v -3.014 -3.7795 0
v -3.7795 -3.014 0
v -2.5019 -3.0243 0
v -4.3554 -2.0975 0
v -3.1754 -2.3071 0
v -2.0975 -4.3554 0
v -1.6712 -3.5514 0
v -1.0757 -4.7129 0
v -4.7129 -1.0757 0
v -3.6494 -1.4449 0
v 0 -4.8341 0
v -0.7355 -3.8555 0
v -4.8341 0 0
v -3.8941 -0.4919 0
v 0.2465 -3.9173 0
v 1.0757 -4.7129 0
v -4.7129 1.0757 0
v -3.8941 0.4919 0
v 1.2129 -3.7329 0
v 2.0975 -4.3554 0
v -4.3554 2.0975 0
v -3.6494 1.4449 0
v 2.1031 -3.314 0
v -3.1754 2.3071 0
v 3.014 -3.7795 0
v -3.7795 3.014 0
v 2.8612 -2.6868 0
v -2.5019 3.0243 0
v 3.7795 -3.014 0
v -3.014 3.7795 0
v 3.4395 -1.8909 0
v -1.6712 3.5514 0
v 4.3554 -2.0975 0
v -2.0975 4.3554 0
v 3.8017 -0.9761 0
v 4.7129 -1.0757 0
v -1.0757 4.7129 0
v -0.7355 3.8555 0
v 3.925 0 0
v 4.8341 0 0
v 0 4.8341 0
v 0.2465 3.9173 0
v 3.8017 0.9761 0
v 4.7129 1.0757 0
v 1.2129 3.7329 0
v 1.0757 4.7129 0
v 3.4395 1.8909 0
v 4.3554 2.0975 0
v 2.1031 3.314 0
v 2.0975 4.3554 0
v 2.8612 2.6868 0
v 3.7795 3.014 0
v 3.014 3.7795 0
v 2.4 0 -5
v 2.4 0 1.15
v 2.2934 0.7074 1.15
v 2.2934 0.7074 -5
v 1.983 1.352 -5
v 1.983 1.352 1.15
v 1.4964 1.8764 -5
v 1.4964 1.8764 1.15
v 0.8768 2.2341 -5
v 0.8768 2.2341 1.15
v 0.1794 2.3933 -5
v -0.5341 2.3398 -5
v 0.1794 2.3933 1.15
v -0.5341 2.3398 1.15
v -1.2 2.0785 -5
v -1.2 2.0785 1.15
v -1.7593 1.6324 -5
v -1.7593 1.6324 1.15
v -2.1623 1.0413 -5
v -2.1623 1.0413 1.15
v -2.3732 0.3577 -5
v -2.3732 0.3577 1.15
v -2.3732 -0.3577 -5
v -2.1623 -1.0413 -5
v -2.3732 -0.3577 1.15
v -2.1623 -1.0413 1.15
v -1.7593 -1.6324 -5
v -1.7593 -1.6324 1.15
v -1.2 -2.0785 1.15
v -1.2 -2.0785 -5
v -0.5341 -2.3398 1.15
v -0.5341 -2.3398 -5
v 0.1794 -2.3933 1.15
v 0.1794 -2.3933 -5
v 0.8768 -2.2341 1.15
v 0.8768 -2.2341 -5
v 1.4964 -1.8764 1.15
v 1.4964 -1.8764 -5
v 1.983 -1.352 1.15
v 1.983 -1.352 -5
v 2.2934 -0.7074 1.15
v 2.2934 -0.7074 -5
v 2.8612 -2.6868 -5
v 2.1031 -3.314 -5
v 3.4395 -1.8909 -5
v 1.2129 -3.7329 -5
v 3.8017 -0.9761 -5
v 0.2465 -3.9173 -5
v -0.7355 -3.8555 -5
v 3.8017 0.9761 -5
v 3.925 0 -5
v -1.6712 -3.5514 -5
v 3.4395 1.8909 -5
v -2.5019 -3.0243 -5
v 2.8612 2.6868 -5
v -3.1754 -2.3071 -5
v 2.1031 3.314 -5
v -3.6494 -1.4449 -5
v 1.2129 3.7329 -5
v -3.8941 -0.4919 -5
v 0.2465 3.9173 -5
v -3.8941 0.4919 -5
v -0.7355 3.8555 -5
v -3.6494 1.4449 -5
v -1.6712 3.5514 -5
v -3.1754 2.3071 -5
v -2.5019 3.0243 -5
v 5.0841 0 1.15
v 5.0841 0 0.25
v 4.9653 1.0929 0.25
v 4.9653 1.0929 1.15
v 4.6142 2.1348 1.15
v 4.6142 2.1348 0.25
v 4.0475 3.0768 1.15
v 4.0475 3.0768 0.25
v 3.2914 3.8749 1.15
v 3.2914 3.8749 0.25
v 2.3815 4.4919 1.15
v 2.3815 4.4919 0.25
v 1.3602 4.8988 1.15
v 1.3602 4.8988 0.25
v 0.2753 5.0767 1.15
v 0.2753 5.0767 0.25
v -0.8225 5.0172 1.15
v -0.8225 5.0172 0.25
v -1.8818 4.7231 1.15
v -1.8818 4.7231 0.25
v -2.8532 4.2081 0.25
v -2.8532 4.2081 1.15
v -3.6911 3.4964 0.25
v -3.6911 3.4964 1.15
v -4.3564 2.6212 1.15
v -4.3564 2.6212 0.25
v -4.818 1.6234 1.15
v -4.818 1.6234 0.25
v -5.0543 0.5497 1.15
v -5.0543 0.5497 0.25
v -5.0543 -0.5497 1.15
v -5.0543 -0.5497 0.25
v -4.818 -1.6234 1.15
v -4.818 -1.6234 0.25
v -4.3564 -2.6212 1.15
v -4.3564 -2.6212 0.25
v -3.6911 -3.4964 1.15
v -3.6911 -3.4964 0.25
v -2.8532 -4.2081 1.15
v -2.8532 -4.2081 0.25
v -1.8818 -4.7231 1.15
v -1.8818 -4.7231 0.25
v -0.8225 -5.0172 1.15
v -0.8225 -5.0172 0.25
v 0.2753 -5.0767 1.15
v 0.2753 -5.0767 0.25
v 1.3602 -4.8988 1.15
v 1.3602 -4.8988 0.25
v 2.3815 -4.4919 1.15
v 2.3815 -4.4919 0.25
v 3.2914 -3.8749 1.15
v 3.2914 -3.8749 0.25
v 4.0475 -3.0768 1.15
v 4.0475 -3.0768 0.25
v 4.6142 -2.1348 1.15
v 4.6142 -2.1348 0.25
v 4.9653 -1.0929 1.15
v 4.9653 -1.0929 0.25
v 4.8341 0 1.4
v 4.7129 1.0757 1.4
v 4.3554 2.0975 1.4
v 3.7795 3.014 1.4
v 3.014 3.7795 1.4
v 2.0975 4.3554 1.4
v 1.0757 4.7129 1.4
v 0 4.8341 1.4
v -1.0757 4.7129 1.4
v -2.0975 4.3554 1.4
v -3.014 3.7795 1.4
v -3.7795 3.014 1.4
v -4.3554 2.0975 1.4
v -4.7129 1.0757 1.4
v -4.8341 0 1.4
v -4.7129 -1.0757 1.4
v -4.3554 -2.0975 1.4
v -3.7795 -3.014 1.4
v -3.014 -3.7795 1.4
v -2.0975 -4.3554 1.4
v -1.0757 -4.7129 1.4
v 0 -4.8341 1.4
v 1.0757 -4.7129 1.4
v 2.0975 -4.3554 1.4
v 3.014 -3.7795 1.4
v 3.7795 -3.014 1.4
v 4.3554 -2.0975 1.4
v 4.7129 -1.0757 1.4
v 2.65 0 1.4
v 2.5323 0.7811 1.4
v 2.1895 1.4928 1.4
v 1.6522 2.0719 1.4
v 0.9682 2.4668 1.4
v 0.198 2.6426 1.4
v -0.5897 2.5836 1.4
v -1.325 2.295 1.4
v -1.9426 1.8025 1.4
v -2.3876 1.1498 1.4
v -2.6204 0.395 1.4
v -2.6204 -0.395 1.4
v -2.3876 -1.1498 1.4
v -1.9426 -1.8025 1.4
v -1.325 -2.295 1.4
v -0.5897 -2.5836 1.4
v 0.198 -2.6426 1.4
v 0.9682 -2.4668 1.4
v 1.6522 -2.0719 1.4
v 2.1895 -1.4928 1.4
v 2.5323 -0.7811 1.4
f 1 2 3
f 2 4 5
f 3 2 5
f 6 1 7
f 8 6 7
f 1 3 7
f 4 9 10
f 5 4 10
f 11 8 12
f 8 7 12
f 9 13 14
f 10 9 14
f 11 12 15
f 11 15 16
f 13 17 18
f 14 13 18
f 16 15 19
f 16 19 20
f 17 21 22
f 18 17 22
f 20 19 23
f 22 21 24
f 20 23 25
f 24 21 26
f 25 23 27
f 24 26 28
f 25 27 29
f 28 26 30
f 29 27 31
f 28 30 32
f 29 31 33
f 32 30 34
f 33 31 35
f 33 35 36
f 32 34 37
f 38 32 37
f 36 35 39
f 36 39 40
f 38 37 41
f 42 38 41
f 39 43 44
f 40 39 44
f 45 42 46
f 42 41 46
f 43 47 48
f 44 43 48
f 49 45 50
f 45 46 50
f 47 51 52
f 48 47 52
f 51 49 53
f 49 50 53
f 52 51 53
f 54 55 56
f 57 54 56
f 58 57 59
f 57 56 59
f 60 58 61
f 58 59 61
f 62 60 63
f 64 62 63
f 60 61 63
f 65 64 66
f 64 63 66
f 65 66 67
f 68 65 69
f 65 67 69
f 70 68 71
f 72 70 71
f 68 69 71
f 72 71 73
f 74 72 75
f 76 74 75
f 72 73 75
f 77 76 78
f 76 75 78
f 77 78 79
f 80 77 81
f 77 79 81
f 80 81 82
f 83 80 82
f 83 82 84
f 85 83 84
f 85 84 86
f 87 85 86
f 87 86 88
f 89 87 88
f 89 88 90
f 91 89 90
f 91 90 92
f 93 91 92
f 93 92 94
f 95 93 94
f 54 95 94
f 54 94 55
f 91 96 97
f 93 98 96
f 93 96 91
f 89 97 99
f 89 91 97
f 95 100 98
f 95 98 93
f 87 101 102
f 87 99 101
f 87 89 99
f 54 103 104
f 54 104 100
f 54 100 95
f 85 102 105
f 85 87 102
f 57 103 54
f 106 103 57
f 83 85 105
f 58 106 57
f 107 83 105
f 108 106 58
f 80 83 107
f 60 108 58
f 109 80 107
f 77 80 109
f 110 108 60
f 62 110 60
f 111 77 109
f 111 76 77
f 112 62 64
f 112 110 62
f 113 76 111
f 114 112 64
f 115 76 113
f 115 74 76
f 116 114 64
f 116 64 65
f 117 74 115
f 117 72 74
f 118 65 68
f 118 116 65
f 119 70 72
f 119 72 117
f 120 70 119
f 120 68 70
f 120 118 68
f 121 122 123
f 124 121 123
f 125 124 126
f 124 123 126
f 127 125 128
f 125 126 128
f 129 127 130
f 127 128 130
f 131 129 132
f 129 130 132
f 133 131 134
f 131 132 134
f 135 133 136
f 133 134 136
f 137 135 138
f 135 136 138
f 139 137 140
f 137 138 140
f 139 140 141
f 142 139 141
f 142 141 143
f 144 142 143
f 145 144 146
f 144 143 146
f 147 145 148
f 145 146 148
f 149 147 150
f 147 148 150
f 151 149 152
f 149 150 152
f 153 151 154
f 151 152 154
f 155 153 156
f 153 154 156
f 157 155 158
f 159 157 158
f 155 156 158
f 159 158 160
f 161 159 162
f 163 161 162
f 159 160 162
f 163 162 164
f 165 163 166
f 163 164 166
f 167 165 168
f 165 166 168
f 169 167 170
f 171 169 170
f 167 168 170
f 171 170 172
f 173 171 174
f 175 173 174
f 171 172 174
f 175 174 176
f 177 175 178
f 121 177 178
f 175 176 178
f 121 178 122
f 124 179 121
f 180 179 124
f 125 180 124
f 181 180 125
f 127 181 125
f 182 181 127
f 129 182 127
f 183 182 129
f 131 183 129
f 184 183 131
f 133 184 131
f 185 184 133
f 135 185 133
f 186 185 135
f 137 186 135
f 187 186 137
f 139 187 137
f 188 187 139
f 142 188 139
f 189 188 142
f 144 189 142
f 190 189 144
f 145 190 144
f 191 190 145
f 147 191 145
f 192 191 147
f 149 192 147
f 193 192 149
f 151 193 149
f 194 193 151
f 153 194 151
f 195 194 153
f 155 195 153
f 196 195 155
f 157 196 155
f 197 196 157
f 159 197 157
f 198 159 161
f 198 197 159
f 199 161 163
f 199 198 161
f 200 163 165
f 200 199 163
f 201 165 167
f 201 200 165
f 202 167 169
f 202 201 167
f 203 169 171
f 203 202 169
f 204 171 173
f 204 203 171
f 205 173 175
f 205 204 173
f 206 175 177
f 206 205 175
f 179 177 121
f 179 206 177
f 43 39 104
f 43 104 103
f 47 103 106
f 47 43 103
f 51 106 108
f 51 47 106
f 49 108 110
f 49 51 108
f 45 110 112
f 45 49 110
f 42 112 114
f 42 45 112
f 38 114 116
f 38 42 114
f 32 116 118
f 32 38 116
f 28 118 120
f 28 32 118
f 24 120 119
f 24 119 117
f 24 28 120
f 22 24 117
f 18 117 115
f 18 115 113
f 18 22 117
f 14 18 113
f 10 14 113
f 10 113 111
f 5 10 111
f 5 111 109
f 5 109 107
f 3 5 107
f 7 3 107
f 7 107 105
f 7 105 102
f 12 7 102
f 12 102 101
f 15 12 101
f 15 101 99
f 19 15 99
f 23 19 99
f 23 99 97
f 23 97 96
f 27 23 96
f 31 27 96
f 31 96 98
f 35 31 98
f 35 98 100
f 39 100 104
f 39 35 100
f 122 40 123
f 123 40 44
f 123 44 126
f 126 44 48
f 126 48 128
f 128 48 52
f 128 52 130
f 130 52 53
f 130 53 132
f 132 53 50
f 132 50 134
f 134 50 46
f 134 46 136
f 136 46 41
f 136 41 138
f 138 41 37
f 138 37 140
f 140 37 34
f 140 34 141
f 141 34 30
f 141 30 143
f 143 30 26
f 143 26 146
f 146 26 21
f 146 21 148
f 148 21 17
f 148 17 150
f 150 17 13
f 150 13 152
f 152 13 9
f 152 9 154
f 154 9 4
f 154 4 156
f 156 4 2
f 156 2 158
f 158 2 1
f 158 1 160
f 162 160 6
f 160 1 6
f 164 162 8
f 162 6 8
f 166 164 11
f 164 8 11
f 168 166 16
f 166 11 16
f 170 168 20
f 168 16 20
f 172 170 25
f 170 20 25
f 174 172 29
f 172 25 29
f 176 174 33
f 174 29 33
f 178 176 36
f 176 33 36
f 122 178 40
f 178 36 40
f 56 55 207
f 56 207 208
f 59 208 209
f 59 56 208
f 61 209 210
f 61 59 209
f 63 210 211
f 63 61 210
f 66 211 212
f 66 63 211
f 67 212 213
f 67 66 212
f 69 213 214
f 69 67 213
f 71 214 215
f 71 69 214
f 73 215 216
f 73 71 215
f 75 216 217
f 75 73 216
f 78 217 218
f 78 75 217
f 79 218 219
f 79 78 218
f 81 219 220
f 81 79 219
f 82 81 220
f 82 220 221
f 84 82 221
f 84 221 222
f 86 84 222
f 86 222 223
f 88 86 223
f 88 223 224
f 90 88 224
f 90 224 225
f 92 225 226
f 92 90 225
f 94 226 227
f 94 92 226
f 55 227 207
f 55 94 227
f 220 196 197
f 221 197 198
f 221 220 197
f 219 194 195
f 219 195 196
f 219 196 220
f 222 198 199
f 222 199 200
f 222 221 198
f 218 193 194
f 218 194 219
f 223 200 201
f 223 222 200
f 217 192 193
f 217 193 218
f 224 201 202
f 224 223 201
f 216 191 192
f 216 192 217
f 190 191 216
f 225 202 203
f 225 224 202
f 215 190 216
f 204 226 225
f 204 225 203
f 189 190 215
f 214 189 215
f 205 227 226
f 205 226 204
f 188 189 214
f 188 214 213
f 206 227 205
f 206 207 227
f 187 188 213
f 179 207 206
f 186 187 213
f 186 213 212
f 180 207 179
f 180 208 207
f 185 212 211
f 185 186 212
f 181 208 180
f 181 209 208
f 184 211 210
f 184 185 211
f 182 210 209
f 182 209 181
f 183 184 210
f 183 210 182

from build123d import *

# Parameters (mm, degrees)
SKETCH1_R           = 3.925
BOSS_EXTRUDE1_DEPTH = 11
SKETCH2_R           = 5.084149635
BOSS_EXTRUDE2_DEPTH = 1.4
SKETCH3_R           = 2.4
CUT_EXTRUDE1_DEPTH  = 15.333776719
CHAMFER1_SIZE       = 0.25
CUT_EXTRUDE2_START  = -6
SKETCH4_R           = 6.115916059
CUT_EXTRUDE2_DEPTH  = 6


with BuildPart() as part:
    # Sketch1 → Boss-Extrude1 (new body)
    with BuildSketch(Plane.XY):
        Circle(SKETCH1_R)
    extrude(amount=-BOSS_EXTRUDE1_DEPTH)

    # Sketch2 → Boss-Extrude2 (add)
    with BuildSketch(Plane.XY):
        Circle(SKETCH2_R)
    extrude(amount=BOSS_EXTRUDE2_DEPTH)

    # Sketch3 → Cut-Extrude1 (cut, through all)
    with BuildSketch(Plane.XY.offset(1.4)):
        Circle(SKETCH3_R)
    extrude(amount=-CUT_EXTRUDE1_DEPTH, mode=Mode.SUBTRACT)

    # Chamfer1
    chamfer1_edges = [part.edges().sort_by_distance(p)[0] for p in [
        (-2.4, 0, -11),
        (-2.4, 0, 1.4),
        (-3.925, 0, -11),
        (-5.084149635, 0, 0),
        (-5.084149635, 0, 1.4),
    ]]
    chamfer(chamfer1_edges, length=CHAMFER1_SIZE)

    # Sketch4 → Cut-Extrude2 (cut)
    with BuildSketch(Plane(origin=(0, 0, -11), x_dir=(-1, 0, 0), z_dir=(0, 0, -1)).offset(CUT_EXTRUDE2_START)):
        Circle(SKETCH4_R)
    extrude(amount=CUT_EXTRUDE2_DEPTH, mode=Mode.SUBTRACT)


solid = part.part
